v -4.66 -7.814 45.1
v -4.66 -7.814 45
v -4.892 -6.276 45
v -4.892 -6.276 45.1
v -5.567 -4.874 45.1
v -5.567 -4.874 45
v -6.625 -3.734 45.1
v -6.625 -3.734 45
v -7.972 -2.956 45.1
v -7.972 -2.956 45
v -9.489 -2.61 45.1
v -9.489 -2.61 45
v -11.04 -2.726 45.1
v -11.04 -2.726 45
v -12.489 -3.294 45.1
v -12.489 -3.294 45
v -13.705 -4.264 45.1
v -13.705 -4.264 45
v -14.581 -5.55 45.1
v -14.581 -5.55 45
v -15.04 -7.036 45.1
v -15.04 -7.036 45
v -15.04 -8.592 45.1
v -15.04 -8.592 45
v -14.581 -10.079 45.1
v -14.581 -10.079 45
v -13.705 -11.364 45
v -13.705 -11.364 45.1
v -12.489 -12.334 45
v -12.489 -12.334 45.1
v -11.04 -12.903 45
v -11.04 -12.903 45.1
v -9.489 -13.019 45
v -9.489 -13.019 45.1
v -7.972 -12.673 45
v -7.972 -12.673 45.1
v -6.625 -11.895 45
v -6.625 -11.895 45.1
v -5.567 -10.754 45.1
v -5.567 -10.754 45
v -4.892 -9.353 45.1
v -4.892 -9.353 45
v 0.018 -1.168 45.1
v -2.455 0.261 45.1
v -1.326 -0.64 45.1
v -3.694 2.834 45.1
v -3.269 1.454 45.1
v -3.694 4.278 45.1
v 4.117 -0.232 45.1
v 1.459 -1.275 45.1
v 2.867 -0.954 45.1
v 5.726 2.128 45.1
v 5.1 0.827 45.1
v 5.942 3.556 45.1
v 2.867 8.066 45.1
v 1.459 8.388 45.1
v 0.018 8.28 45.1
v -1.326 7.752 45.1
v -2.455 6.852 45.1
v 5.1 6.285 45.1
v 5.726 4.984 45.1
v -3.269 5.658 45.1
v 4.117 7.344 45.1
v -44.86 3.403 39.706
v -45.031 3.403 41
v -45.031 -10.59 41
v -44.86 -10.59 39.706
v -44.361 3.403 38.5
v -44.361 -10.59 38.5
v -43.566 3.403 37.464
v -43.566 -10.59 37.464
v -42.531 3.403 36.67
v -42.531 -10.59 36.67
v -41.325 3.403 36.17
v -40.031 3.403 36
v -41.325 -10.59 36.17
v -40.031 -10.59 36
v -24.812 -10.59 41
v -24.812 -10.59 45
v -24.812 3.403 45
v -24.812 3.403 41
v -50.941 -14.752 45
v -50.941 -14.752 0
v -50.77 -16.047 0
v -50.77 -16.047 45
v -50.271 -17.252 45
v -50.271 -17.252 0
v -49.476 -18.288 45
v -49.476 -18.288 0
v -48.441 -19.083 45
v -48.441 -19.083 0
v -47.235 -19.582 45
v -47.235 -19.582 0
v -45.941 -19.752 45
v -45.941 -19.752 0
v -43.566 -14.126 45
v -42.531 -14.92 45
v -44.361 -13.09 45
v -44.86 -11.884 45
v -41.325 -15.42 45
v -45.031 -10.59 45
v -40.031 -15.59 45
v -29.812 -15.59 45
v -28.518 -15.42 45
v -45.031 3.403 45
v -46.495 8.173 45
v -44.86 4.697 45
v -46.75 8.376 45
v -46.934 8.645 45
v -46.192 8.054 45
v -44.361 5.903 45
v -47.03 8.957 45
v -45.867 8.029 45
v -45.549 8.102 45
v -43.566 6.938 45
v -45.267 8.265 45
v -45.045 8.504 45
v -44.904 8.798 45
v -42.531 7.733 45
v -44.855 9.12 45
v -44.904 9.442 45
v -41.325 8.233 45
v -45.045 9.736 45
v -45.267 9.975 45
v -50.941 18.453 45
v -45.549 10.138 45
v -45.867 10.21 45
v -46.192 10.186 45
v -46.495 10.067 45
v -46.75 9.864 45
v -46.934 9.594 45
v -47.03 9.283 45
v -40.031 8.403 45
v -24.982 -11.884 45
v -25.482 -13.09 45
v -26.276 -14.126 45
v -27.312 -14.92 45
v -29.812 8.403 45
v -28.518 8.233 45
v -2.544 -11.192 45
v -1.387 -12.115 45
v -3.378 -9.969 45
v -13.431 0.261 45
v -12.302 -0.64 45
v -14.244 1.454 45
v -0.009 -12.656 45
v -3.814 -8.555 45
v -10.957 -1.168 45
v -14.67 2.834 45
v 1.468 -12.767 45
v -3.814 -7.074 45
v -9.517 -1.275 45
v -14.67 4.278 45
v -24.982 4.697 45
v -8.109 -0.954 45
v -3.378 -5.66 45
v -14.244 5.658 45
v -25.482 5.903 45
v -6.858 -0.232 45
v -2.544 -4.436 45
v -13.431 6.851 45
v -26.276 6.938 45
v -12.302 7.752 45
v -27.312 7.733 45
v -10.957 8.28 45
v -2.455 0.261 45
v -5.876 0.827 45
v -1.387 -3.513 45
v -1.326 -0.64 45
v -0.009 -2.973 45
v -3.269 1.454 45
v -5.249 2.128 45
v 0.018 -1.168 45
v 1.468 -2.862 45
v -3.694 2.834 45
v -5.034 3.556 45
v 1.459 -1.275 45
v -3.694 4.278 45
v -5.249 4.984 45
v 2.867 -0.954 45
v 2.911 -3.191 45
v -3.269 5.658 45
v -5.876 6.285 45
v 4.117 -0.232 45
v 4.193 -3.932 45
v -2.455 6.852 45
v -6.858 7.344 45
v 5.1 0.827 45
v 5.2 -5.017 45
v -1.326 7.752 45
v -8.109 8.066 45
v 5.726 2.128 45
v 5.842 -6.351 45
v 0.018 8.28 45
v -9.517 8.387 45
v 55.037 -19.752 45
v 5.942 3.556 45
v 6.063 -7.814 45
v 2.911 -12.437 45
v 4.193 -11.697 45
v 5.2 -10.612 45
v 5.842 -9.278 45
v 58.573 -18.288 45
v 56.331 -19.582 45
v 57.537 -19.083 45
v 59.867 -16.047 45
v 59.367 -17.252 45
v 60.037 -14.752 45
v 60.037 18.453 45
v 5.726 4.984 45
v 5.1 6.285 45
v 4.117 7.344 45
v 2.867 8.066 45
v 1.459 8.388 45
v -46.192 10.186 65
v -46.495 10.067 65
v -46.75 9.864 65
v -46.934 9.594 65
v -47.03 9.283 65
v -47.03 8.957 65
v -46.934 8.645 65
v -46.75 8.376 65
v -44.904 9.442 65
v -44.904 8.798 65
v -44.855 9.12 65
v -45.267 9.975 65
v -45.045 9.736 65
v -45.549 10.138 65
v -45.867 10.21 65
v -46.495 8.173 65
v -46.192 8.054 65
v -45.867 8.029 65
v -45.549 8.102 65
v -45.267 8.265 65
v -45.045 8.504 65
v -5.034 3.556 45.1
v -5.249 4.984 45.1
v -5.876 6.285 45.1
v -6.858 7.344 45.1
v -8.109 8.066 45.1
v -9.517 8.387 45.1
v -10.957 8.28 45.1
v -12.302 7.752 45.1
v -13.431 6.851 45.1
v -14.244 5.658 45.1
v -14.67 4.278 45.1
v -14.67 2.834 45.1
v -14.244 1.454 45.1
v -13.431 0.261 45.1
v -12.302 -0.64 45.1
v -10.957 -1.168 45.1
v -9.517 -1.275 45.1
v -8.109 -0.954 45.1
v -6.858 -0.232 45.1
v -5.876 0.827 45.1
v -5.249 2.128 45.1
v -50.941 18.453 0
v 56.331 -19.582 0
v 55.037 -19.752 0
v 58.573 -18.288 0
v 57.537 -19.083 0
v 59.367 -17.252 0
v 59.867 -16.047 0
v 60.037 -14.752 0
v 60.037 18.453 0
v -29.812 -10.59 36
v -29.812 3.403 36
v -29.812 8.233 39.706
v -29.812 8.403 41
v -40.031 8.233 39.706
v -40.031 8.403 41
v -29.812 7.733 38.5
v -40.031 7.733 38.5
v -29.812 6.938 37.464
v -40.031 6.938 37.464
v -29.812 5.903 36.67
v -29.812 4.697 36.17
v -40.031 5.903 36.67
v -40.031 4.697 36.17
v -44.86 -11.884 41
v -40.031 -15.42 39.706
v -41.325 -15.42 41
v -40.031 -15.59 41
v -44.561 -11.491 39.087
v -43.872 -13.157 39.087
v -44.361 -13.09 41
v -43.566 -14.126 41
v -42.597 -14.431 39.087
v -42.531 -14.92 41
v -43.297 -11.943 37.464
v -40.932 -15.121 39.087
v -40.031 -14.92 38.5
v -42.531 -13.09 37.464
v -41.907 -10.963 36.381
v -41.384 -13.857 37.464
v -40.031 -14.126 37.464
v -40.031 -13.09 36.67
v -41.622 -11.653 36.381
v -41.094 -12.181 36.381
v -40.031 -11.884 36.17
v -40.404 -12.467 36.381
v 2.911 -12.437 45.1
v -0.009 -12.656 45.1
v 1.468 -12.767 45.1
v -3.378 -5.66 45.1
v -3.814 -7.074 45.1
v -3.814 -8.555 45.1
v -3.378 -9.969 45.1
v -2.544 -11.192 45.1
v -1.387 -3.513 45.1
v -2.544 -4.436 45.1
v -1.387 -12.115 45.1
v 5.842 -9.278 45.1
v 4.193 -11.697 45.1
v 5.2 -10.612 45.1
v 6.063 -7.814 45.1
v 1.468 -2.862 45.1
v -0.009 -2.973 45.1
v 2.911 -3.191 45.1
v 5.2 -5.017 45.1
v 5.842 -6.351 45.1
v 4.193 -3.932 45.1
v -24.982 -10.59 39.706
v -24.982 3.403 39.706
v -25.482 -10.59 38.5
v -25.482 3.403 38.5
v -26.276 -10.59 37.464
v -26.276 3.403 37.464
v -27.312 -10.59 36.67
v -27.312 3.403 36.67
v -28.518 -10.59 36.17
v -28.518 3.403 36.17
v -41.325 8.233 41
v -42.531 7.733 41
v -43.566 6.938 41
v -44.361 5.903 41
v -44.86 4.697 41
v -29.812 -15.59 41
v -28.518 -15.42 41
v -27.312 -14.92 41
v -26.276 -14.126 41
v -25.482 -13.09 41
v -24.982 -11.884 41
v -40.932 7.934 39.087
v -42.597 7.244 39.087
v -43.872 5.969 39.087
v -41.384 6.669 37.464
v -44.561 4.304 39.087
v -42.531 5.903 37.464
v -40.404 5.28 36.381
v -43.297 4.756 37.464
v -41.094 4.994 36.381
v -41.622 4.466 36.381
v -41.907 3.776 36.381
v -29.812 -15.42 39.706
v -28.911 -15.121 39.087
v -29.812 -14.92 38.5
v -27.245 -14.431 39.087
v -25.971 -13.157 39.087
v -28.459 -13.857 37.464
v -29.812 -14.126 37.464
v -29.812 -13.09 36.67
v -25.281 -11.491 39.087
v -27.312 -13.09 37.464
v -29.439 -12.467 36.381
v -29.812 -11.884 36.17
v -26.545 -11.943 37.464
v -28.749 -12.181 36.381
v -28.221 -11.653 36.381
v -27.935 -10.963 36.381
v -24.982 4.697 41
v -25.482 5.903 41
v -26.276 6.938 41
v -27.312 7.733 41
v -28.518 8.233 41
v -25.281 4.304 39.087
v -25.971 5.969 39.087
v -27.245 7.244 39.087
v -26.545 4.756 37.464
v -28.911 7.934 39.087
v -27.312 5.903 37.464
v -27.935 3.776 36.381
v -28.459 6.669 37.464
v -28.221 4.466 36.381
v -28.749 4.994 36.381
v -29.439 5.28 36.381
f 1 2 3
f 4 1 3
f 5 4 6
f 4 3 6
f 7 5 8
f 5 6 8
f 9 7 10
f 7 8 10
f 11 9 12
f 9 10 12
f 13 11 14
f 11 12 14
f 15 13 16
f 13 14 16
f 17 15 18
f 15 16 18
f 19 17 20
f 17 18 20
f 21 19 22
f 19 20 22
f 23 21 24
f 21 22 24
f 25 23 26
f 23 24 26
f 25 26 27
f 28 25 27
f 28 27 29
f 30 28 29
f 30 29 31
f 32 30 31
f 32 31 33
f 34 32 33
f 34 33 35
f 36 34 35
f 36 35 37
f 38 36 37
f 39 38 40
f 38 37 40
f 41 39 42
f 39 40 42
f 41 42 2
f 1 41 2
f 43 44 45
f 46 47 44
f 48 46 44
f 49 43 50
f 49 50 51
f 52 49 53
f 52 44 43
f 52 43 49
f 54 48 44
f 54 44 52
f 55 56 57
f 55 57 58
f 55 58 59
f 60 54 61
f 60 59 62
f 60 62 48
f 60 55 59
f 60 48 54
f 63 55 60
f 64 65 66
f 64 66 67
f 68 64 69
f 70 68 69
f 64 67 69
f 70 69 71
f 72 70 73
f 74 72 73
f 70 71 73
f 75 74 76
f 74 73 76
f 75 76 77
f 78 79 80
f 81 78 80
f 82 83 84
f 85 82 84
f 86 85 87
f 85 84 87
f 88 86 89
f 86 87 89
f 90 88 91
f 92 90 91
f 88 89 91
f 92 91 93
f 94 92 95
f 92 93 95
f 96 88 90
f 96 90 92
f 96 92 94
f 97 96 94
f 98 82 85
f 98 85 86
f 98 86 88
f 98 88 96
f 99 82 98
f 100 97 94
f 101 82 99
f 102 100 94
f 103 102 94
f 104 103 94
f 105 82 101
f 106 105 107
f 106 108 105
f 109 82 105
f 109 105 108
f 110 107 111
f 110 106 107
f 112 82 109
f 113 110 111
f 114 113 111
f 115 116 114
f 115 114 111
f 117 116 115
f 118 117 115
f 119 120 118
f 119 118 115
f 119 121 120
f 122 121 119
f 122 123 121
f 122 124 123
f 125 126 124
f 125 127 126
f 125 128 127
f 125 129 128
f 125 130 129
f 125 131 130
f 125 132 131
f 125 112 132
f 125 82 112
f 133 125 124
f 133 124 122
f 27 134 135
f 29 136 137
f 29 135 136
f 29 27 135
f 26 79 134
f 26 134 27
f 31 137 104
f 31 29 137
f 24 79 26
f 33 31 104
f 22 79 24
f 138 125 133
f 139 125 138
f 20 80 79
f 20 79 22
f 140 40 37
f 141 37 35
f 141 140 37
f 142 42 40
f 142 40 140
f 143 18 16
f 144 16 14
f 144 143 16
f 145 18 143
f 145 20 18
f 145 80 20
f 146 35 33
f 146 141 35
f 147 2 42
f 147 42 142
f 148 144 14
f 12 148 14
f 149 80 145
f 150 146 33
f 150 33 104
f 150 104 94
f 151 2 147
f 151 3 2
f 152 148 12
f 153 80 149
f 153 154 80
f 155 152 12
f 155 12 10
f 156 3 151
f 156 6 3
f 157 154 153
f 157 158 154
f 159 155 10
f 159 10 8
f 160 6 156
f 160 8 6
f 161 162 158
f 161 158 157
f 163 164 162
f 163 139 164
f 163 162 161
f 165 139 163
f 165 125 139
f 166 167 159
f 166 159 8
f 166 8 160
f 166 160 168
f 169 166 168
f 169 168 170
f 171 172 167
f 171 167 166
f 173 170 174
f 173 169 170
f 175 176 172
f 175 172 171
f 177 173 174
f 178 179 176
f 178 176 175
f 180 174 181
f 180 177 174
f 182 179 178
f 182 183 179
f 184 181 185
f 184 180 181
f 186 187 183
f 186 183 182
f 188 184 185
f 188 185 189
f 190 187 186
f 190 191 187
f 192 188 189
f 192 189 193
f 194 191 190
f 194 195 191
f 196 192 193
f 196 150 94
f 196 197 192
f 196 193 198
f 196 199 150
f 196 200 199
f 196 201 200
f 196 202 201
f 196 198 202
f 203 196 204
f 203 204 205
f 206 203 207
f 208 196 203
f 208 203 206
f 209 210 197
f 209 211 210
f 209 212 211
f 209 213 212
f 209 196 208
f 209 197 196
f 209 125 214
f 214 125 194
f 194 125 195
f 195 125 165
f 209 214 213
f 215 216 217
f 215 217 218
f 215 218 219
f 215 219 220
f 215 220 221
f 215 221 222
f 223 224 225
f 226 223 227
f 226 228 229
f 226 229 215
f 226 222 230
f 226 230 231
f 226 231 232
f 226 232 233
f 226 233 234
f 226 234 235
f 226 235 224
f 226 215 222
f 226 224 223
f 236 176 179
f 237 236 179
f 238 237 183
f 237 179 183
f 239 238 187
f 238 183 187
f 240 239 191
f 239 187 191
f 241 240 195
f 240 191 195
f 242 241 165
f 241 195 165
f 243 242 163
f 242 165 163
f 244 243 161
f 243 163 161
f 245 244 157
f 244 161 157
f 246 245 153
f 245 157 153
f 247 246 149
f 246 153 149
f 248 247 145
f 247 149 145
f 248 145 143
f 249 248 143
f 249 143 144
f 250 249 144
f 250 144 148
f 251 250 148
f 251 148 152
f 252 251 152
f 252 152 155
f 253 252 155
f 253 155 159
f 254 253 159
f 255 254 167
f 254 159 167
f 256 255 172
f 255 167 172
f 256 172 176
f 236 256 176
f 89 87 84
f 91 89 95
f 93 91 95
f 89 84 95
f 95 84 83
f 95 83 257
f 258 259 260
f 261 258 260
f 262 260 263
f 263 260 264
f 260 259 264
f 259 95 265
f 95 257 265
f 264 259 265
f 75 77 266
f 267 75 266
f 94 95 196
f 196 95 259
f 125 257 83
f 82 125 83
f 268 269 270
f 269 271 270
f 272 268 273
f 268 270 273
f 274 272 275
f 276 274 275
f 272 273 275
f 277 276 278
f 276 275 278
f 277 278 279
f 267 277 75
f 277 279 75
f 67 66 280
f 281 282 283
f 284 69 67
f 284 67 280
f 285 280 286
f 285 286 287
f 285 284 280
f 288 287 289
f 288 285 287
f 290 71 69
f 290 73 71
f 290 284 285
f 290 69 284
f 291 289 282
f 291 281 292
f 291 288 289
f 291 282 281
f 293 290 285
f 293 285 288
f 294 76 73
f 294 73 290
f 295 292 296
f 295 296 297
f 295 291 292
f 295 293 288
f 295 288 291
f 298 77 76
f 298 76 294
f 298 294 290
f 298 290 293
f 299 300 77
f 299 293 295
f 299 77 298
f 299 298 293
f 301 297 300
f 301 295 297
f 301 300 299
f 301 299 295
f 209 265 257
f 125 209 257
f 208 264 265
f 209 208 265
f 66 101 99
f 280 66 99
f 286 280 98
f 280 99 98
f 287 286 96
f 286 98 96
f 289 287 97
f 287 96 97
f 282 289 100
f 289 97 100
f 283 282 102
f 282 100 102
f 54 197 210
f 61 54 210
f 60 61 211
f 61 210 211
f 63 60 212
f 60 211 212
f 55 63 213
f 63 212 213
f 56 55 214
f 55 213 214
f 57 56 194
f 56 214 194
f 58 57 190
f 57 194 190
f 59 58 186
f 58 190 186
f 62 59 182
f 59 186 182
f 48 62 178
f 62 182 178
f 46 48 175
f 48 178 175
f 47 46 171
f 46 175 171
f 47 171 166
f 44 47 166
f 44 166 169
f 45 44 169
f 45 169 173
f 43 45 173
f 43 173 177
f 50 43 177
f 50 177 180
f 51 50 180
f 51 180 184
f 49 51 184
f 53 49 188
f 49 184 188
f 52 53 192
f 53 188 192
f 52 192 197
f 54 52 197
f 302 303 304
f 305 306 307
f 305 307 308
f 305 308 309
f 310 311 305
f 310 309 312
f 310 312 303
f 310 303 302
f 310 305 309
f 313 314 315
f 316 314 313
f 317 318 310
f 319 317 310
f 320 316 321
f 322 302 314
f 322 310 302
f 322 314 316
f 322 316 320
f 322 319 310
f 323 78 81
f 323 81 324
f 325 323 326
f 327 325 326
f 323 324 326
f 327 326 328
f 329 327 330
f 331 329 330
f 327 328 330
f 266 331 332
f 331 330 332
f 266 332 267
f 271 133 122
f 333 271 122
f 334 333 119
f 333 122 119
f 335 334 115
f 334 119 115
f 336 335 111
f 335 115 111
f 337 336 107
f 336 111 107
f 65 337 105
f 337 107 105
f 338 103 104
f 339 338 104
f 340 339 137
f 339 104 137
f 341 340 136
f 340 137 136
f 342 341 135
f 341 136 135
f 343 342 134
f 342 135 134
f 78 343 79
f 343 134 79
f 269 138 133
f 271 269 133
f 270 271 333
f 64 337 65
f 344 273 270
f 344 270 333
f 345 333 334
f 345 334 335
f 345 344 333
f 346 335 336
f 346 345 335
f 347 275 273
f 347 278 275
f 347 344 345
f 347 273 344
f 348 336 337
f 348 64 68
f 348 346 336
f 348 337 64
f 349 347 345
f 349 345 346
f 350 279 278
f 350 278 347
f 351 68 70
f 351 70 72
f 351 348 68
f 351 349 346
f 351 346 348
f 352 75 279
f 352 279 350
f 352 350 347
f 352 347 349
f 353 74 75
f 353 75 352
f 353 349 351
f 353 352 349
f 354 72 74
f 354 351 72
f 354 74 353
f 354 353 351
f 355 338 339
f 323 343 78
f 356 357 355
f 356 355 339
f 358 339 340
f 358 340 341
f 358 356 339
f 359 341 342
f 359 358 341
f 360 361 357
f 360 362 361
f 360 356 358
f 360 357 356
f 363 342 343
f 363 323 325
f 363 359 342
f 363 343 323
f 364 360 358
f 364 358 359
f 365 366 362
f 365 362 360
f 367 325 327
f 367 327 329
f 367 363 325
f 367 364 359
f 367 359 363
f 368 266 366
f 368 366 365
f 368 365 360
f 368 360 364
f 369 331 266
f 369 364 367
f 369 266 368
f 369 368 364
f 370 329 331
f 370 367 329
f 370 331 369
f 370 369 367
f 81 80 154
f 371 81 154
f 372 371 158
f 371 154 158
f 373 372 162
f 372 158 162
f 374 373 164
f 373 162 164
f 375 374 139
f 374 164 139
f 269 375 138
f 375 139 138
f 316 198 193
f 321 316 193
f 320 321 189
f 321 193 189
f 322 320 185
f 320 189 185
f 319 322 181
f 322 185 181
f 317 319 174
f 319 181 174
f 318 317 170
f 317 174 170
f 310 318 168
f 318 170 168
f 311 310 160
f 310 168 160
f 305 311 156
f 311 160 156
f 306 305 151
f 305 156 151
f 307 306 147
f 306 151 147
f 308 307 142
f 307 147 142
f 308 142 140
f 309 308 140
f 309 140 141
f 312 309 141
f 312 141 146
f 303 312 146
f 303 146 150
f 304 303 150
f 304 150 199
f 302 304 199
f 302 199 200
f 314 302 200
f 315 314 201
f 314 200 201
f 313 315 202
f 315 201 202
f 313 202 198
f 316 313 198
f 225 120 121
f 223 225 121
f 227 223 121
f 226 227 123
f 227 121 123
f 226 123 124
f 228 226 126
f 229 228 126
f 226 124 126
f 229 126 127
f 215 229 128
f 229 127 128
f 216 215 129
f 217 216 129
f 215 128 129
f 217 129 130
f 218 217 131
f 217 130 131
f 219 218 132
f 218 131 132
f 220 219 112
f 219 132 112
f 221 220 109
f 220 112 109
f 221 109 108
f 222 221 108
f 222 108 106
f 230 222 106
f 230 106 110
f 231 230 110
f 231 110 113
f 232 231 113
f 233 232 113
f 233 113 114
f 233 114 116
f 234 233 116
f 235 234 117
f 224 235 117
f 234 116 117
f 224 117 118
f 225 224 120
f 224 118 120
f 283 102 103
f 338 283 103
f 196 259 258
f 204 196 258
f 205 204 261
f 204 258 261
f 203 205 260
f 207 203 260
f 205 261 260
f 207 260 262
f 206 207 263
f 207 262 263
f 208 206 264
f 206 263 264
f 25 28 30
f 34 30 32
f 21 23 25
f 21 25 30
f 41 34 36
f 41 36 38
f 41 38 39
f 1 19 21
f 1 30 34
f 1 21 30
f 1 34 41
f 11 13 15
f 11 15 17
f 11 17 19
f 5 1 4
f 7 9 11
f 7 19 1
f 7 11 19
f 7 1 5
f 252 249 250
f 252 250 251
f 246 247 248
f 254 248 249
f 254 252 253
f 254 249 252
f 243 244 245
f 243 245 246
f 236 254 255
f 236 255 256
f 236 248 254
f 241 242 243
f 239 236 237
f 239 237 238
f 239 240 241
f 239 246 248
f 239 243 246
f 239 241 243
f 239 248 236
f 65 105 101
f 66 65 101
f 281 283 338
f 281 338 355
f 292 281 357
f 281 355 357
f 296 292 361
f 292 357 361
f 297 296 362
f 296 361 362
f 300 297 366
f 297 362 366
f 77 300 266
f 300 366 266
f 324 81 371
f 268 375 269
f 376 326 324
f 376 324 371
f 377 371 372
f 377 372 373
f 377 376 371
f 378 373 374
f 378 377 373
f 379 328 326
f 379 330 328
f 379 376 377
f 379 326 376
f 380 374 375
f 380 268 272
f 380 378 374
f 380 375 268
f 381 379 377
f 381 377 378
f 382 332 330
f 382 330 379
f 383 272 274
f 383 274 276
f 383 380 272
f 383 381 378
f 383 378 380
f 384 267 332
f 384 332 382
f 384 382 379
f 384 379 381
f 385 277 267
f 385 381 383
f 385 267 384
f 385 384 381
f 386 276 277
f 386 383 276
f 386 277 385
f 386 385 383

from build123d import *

# Parameters (mm, degrees)
F1_DEPTH = 45
F2_R     = 4.8450580426
F2_R_2   = 4.845014418
F2_R_3   = 5.2193072221
F2_R_4   = 4.9662241181
F3_DEPTH = 0.1
F4_DEPTH = 9
F5_R     = 5
F2_R_5   = 1.0935604598
F6_DEPTH = 20


with BuildPart() as f1:
    # F0 (on Top) → F1 (new body)
    with BuildSketch(Plane.XY):
        with BuildLine():
            Line((60.0371286273, 18.452970311), (-50.9405955672, 18.452970311))
            Line((-50.9405955672, 18.452970311), (-50.9405955672, -14.7524763644))
            ThreePointArc((-50.9405955672, -14.7524763644), (-49.4761294732, -18.2880102703), (-45.9405955672, -19.7524763644))
            Line((-45.9405955672, -19.7524763644), (55.0371286273, -19.7524763644))
            ThreePointArc((55.0371286273, -19.7524763644), (58.5726625332, -18.2880102703), (60.0371286273, -14.7524763644))
            Line((60.0371286273, -14.7524763644), (60.0371286273, 18.452970311))
        make_face()
    extrude(amount=F1_DEPTH)

    # F2 (on face) → F3 (join)
    with BuildSketch(Plane.XY.offset(45)):
        with Locations((1.0965270922, 3.5560266115)):
            Circle(F2_R)
        with Locations((-9.8790517077, 3.5560266115)):
            Circle(F2_R_2)
        with Locations((-9.8790517077, -7.8143570572)):
            Circle(F2_R_3)
        with Locations((1.0965270922, -7.8143570572)):
            Circle(F2_R_4)
    extrude(amount=F3_DEPTH)

    # F2 (on face) → F4 (cut)
    with BuildSketch(Plane.XY.offset(45)):
        with BuildLine():
            Line((-29.8118992895, 8.4029044956), (-40.030772686, 8.4029044956))
            ThreePointArc((-40.030772686, 8.4029044956), (-43.5663065919, 6.9384384015), (-45.030772686, 3.4029044956))
            Line((-45.030772686, 3.4029044956), (-45.030772686, -10.5901564285))
            ThreePointArc((-45.030772686, -10.5901564285), (-43.5663065919, -14.1256903344), (-40.030772686, -15.5901564285))
            Line((-40.030772686, -15.5901564285), (-29.8118992895, -15.5901564285))
            ThreePointArc((-29.8118992895, -15.5901564285), (-26.2763653836, -14.1256903344), (-24.8118992895, -10.5901564285))
            Line((-24.8118992895, -10.5901564285), (-24.8118992895, 3.4029044956))
            ThreePointArc((-24.8118992895, 3.4029044956), (-26.2763653836, 6.9384384015), (-29.8118992895, 8.4029044956))
        make_face()
    extrude(amount=-F4_DEPTH, mode=Mode.SUBTRACT)

    # F5
    f5_edges = [f1.edges().sort_by_distance(p)[0] for p in [
        (-43.566307, 6.938438, 36),
        (-34.921336, 8.402904, 36),
    ]]
    fillet(f5_edges, radius=F5_R)

    # F2 (on face) → F6 (join)
    with BuildSketch(Plane.XY.offset(45)):
        with Locations((-45.9486916661, 9.11985524)):
            Circle(F2_R_5)
    extrude(amount=F6_DEPTH)


solid = f1.part
